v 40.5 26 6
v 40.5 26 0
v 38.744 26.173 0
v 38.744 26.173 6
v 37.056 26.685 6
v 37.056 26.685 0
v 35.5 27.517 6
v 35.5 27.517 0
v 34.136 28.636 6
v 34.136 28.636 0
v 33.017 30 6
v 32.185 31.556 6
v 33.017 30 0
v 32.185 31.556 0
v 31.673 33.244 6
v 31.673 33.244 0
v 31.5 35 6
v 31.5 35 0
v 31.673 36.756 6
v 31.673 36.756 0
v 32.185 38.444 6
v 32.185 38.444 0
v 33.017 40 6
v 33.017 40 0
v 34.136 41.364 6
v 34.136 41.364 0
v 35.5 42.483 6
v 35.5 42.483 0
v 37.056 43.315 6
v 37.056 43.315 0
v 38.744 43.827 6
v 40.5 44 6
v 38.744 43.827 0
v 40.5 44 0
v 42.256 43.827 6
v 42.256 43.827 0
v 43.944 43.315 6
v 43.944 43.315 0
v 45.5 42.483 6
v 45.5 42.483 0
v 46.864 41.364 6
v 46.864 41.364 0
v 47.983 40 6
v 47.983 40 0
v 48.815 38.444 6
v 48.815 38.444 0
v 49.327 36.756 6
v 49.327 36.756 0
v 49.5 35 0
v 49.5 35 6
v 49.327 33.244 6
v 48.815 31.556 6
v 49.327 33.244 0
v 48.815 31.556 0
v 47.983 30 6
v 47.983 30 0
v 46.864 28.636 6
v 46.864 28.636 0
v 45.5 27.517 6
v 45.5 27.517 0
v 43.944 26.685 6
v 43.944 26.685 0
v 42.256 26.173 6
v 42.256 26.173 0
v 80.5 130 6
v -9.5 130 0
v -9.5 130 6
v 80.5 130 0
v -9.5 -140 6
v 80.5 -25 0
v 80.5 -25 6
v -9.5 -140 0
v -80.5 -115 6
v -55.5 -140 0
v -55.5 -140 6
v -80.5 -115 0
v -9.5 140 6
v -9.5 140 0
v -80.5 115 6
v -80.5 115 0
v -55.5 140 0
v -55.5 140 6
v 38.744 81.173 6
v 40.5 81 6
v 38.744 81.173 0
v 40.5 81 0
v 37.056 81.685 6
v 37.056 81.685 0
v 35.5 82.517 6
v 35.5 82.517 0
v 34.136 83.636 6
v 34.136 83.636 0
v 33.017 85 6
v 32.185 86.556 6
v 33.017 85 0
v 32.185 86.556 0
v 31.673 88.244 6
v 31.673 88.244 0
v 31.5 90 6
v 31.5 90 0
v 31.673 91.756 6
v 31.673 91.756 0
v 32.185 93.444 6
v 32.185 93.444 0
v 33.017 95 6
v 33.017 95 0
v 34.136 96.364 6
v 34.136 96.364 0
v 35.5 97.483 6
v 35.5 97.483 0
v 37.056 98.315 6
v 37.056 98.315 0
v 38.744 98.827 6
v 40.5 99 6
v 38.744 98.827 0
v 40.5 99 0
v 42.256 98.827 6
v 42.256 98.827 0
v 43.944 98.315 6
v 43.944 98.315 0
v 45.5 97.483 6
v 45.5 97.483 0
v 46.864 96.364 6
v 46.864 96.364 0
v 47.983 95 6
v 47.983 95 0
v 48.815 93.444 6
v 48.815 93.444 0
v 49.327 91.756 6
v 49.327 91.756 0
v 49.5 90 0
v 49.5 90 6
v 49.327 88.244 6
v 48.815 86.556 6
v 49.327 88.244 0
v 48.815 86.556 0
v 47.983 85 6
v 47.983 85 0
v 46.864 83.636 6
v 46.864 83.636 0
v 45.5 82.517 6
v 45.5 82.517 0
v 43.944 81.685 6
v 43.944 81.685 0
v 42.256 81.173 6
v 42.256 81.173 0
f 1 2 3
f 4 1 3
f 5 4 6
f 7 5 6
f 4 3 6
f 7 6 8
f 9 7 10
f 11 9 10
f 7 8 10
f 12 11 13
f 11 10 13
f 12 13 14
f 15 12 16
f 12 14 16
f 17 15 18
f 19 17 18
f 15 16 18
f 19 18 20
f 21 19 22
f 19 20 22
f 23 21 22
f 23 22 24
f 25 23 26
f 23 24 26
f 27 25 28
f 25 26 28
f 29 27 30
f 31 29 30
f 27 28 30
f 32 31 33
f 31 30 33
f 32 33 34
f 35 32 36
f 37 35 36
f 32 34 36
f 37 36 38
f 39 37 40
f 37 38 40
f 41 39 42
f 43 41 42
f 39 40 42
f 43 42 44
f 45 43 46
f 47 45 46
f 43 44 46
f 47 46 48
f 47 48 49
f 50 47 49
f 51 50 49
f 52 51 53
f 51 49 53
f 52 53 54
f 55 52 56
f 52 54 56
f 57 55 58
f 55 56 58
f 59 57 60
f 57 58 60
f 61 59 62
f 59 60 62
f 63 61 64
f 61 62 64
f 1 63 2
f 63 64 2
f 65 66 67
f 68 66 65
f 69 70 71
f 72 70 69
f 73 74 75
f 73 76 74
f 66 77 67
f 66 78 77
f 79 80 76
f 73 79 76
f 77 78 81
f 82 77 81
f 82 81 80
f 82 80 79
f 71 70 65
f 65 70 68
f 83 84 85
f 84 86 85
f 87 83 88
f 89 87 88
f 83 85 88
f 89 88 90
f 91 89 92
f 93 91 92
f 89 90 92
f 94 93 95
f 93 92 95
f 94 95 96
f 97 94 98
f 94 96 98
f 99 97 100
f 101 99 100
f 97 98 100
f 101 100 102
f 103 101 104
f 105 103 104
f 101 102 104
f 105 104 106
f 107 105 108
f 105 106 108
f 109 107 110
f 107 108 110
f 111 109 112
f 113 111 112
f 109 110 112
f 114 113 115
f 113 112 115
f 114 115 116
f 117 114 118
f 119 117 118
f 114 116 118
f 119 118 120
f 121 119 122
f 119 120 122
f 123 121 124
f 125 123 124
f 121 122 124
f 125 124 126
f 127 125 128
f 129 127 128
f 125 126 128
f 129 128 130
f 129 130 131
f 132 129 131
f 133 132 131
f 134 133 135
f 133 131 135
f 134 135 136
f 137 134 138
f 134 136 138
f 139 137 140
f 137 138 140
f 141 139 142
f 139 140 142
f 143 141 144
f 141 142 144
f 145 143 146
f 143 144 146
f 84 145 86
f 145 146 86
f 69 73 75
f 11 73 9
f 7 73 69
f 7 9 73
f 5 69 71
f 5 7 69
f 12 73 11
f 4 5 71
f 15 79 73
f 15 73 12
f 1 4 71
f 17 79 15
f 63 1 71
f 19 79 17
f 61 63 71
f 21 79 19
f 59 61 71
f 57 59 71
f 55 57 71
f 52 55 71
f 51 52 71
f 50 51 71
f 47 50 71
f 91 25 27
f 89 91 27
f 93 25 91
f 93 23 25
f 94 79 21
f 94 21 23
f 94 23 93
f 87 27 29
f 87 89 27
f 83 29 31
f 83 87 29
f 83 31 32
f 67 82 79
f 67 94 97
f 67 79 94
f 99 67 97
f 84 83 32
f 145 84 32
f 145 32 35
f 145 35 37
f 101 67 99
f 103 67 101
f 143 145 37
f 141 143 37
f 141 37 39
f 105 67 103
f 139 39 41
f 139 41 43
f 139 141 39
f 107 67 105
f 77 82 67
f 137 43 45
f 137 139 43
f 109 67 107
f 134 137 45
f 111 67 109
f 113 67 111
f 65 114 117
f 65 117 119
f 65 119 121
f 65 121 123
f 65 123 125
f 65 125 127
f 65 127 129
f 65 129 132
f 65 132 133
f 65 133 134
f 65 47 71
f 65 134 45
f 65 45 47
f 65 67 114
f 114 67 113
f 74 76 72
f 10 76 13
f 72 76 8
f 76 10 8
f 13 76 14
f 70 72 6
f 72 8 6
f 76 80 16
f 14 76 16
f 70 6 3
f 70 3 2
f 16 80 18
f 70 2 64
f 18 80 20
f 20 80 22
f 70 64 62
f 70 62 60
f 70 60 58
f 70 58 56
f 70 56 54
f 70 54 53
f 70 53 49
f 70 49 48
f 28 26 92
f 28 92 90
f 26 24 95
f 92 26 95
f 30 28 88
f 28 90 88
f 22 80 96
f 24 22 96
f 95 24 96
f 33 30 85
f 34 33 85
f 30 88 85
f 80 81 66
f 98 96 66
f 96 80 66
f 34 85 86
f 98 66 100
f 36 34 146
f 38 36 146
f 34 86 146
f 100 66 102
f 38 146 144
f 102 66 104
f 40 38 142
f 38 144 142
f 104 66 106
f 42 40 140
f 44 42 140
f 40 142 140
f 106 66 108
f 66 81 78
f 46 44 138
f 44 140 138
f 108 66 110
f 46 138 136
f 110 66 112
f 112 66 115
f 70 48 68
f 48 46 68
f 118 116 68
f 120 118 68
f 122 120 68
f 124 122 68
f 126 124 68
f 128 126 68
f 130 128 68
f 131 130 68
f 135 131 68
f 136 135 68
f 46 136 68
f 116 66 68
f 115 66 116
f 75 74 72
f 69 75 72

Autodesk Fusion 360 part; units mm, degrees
sketch "スケッチ1" plane through (0, 0, 0) normal (0, 0, 1) x (1, 0, 0)
  line L0 (-9.5, 140) -> (-80.5, 140)
  line L1 (-80.5, 140) -> (-80.5, -140)
  line L2 (-80.5, -140) -> (-9.5, -140)
  line L3 (80.5, -25) -> (80.5, 130)
  line L4 (74.75, 130) -> (-80.5, -140) construction
  line L5 (-80.5, 140) -> (42.3815, -73.707) construction
  line L6 (-9.5, 140) -> (-9.5, 130)
  line L7 (-9.5, 130) -> (80.5, 130)
  line L8 (-80.5, -140) -> (-9.5, -140) construction
  line L9 (80.5, -25) -> (-9.5, -140)
  dimension "d2" = 280
  dimension "d5" = 71
extrude "押し出し1" add sketch "スケッチ1" along normal blind 6
chamfer "面取り1" distance 25 angle 45 2 edges at (-80.5, -140, 3) (-80.5, 140, 3)
sketch "スケッチ2" plane through (0, 0, 6) normal (0, 0, 1) x (-1, 0, 0)
  line L0 (55.5, -140) -> (80.5, -115)
  line L1 (80.5, -115) -> (80.5, 115)
  line L2 (80.5, 115) -> (55.5, 140)
  line L3 (55.5, 140) -> (9.5, 140)
  line L4 (9.5, 140) -> (-80.5, 25)
  line L5 (-80.5, 25) -> (-80.5, -130)
  line L6 (-80.5, -130) -> (9.5, -130)
  line L7 (9.5, -130) -> (9.5, -140)
  line L8 (9.5, -140) -> (55.5, -140)
  line L9 (-80.5, -130) -> (-40.5, -130) construction
  line L10 (-40.5, -130) -> (-40.5, -90) construction
  line L11 (-40.5, -90) -> (-80.5, -90) construction
  line L12 (-80.5, -90) -> (-80.5, -130) construction
  line L13 (-40.5, -90) -> (-40.5, -35) construction
  point P0 (-40.5, -90)
  point P1 (-40.5, -35)
  dimension "d10" = 40
  dimension "d11" = 40
  dimension "d12" = 55
hole "穴1" at (40.5, 90, 6) at (40.5, 35, 6) direction (0, 0, -1) diameter 18 end through all
equation "d5 = 25 mm + 46 mm"
